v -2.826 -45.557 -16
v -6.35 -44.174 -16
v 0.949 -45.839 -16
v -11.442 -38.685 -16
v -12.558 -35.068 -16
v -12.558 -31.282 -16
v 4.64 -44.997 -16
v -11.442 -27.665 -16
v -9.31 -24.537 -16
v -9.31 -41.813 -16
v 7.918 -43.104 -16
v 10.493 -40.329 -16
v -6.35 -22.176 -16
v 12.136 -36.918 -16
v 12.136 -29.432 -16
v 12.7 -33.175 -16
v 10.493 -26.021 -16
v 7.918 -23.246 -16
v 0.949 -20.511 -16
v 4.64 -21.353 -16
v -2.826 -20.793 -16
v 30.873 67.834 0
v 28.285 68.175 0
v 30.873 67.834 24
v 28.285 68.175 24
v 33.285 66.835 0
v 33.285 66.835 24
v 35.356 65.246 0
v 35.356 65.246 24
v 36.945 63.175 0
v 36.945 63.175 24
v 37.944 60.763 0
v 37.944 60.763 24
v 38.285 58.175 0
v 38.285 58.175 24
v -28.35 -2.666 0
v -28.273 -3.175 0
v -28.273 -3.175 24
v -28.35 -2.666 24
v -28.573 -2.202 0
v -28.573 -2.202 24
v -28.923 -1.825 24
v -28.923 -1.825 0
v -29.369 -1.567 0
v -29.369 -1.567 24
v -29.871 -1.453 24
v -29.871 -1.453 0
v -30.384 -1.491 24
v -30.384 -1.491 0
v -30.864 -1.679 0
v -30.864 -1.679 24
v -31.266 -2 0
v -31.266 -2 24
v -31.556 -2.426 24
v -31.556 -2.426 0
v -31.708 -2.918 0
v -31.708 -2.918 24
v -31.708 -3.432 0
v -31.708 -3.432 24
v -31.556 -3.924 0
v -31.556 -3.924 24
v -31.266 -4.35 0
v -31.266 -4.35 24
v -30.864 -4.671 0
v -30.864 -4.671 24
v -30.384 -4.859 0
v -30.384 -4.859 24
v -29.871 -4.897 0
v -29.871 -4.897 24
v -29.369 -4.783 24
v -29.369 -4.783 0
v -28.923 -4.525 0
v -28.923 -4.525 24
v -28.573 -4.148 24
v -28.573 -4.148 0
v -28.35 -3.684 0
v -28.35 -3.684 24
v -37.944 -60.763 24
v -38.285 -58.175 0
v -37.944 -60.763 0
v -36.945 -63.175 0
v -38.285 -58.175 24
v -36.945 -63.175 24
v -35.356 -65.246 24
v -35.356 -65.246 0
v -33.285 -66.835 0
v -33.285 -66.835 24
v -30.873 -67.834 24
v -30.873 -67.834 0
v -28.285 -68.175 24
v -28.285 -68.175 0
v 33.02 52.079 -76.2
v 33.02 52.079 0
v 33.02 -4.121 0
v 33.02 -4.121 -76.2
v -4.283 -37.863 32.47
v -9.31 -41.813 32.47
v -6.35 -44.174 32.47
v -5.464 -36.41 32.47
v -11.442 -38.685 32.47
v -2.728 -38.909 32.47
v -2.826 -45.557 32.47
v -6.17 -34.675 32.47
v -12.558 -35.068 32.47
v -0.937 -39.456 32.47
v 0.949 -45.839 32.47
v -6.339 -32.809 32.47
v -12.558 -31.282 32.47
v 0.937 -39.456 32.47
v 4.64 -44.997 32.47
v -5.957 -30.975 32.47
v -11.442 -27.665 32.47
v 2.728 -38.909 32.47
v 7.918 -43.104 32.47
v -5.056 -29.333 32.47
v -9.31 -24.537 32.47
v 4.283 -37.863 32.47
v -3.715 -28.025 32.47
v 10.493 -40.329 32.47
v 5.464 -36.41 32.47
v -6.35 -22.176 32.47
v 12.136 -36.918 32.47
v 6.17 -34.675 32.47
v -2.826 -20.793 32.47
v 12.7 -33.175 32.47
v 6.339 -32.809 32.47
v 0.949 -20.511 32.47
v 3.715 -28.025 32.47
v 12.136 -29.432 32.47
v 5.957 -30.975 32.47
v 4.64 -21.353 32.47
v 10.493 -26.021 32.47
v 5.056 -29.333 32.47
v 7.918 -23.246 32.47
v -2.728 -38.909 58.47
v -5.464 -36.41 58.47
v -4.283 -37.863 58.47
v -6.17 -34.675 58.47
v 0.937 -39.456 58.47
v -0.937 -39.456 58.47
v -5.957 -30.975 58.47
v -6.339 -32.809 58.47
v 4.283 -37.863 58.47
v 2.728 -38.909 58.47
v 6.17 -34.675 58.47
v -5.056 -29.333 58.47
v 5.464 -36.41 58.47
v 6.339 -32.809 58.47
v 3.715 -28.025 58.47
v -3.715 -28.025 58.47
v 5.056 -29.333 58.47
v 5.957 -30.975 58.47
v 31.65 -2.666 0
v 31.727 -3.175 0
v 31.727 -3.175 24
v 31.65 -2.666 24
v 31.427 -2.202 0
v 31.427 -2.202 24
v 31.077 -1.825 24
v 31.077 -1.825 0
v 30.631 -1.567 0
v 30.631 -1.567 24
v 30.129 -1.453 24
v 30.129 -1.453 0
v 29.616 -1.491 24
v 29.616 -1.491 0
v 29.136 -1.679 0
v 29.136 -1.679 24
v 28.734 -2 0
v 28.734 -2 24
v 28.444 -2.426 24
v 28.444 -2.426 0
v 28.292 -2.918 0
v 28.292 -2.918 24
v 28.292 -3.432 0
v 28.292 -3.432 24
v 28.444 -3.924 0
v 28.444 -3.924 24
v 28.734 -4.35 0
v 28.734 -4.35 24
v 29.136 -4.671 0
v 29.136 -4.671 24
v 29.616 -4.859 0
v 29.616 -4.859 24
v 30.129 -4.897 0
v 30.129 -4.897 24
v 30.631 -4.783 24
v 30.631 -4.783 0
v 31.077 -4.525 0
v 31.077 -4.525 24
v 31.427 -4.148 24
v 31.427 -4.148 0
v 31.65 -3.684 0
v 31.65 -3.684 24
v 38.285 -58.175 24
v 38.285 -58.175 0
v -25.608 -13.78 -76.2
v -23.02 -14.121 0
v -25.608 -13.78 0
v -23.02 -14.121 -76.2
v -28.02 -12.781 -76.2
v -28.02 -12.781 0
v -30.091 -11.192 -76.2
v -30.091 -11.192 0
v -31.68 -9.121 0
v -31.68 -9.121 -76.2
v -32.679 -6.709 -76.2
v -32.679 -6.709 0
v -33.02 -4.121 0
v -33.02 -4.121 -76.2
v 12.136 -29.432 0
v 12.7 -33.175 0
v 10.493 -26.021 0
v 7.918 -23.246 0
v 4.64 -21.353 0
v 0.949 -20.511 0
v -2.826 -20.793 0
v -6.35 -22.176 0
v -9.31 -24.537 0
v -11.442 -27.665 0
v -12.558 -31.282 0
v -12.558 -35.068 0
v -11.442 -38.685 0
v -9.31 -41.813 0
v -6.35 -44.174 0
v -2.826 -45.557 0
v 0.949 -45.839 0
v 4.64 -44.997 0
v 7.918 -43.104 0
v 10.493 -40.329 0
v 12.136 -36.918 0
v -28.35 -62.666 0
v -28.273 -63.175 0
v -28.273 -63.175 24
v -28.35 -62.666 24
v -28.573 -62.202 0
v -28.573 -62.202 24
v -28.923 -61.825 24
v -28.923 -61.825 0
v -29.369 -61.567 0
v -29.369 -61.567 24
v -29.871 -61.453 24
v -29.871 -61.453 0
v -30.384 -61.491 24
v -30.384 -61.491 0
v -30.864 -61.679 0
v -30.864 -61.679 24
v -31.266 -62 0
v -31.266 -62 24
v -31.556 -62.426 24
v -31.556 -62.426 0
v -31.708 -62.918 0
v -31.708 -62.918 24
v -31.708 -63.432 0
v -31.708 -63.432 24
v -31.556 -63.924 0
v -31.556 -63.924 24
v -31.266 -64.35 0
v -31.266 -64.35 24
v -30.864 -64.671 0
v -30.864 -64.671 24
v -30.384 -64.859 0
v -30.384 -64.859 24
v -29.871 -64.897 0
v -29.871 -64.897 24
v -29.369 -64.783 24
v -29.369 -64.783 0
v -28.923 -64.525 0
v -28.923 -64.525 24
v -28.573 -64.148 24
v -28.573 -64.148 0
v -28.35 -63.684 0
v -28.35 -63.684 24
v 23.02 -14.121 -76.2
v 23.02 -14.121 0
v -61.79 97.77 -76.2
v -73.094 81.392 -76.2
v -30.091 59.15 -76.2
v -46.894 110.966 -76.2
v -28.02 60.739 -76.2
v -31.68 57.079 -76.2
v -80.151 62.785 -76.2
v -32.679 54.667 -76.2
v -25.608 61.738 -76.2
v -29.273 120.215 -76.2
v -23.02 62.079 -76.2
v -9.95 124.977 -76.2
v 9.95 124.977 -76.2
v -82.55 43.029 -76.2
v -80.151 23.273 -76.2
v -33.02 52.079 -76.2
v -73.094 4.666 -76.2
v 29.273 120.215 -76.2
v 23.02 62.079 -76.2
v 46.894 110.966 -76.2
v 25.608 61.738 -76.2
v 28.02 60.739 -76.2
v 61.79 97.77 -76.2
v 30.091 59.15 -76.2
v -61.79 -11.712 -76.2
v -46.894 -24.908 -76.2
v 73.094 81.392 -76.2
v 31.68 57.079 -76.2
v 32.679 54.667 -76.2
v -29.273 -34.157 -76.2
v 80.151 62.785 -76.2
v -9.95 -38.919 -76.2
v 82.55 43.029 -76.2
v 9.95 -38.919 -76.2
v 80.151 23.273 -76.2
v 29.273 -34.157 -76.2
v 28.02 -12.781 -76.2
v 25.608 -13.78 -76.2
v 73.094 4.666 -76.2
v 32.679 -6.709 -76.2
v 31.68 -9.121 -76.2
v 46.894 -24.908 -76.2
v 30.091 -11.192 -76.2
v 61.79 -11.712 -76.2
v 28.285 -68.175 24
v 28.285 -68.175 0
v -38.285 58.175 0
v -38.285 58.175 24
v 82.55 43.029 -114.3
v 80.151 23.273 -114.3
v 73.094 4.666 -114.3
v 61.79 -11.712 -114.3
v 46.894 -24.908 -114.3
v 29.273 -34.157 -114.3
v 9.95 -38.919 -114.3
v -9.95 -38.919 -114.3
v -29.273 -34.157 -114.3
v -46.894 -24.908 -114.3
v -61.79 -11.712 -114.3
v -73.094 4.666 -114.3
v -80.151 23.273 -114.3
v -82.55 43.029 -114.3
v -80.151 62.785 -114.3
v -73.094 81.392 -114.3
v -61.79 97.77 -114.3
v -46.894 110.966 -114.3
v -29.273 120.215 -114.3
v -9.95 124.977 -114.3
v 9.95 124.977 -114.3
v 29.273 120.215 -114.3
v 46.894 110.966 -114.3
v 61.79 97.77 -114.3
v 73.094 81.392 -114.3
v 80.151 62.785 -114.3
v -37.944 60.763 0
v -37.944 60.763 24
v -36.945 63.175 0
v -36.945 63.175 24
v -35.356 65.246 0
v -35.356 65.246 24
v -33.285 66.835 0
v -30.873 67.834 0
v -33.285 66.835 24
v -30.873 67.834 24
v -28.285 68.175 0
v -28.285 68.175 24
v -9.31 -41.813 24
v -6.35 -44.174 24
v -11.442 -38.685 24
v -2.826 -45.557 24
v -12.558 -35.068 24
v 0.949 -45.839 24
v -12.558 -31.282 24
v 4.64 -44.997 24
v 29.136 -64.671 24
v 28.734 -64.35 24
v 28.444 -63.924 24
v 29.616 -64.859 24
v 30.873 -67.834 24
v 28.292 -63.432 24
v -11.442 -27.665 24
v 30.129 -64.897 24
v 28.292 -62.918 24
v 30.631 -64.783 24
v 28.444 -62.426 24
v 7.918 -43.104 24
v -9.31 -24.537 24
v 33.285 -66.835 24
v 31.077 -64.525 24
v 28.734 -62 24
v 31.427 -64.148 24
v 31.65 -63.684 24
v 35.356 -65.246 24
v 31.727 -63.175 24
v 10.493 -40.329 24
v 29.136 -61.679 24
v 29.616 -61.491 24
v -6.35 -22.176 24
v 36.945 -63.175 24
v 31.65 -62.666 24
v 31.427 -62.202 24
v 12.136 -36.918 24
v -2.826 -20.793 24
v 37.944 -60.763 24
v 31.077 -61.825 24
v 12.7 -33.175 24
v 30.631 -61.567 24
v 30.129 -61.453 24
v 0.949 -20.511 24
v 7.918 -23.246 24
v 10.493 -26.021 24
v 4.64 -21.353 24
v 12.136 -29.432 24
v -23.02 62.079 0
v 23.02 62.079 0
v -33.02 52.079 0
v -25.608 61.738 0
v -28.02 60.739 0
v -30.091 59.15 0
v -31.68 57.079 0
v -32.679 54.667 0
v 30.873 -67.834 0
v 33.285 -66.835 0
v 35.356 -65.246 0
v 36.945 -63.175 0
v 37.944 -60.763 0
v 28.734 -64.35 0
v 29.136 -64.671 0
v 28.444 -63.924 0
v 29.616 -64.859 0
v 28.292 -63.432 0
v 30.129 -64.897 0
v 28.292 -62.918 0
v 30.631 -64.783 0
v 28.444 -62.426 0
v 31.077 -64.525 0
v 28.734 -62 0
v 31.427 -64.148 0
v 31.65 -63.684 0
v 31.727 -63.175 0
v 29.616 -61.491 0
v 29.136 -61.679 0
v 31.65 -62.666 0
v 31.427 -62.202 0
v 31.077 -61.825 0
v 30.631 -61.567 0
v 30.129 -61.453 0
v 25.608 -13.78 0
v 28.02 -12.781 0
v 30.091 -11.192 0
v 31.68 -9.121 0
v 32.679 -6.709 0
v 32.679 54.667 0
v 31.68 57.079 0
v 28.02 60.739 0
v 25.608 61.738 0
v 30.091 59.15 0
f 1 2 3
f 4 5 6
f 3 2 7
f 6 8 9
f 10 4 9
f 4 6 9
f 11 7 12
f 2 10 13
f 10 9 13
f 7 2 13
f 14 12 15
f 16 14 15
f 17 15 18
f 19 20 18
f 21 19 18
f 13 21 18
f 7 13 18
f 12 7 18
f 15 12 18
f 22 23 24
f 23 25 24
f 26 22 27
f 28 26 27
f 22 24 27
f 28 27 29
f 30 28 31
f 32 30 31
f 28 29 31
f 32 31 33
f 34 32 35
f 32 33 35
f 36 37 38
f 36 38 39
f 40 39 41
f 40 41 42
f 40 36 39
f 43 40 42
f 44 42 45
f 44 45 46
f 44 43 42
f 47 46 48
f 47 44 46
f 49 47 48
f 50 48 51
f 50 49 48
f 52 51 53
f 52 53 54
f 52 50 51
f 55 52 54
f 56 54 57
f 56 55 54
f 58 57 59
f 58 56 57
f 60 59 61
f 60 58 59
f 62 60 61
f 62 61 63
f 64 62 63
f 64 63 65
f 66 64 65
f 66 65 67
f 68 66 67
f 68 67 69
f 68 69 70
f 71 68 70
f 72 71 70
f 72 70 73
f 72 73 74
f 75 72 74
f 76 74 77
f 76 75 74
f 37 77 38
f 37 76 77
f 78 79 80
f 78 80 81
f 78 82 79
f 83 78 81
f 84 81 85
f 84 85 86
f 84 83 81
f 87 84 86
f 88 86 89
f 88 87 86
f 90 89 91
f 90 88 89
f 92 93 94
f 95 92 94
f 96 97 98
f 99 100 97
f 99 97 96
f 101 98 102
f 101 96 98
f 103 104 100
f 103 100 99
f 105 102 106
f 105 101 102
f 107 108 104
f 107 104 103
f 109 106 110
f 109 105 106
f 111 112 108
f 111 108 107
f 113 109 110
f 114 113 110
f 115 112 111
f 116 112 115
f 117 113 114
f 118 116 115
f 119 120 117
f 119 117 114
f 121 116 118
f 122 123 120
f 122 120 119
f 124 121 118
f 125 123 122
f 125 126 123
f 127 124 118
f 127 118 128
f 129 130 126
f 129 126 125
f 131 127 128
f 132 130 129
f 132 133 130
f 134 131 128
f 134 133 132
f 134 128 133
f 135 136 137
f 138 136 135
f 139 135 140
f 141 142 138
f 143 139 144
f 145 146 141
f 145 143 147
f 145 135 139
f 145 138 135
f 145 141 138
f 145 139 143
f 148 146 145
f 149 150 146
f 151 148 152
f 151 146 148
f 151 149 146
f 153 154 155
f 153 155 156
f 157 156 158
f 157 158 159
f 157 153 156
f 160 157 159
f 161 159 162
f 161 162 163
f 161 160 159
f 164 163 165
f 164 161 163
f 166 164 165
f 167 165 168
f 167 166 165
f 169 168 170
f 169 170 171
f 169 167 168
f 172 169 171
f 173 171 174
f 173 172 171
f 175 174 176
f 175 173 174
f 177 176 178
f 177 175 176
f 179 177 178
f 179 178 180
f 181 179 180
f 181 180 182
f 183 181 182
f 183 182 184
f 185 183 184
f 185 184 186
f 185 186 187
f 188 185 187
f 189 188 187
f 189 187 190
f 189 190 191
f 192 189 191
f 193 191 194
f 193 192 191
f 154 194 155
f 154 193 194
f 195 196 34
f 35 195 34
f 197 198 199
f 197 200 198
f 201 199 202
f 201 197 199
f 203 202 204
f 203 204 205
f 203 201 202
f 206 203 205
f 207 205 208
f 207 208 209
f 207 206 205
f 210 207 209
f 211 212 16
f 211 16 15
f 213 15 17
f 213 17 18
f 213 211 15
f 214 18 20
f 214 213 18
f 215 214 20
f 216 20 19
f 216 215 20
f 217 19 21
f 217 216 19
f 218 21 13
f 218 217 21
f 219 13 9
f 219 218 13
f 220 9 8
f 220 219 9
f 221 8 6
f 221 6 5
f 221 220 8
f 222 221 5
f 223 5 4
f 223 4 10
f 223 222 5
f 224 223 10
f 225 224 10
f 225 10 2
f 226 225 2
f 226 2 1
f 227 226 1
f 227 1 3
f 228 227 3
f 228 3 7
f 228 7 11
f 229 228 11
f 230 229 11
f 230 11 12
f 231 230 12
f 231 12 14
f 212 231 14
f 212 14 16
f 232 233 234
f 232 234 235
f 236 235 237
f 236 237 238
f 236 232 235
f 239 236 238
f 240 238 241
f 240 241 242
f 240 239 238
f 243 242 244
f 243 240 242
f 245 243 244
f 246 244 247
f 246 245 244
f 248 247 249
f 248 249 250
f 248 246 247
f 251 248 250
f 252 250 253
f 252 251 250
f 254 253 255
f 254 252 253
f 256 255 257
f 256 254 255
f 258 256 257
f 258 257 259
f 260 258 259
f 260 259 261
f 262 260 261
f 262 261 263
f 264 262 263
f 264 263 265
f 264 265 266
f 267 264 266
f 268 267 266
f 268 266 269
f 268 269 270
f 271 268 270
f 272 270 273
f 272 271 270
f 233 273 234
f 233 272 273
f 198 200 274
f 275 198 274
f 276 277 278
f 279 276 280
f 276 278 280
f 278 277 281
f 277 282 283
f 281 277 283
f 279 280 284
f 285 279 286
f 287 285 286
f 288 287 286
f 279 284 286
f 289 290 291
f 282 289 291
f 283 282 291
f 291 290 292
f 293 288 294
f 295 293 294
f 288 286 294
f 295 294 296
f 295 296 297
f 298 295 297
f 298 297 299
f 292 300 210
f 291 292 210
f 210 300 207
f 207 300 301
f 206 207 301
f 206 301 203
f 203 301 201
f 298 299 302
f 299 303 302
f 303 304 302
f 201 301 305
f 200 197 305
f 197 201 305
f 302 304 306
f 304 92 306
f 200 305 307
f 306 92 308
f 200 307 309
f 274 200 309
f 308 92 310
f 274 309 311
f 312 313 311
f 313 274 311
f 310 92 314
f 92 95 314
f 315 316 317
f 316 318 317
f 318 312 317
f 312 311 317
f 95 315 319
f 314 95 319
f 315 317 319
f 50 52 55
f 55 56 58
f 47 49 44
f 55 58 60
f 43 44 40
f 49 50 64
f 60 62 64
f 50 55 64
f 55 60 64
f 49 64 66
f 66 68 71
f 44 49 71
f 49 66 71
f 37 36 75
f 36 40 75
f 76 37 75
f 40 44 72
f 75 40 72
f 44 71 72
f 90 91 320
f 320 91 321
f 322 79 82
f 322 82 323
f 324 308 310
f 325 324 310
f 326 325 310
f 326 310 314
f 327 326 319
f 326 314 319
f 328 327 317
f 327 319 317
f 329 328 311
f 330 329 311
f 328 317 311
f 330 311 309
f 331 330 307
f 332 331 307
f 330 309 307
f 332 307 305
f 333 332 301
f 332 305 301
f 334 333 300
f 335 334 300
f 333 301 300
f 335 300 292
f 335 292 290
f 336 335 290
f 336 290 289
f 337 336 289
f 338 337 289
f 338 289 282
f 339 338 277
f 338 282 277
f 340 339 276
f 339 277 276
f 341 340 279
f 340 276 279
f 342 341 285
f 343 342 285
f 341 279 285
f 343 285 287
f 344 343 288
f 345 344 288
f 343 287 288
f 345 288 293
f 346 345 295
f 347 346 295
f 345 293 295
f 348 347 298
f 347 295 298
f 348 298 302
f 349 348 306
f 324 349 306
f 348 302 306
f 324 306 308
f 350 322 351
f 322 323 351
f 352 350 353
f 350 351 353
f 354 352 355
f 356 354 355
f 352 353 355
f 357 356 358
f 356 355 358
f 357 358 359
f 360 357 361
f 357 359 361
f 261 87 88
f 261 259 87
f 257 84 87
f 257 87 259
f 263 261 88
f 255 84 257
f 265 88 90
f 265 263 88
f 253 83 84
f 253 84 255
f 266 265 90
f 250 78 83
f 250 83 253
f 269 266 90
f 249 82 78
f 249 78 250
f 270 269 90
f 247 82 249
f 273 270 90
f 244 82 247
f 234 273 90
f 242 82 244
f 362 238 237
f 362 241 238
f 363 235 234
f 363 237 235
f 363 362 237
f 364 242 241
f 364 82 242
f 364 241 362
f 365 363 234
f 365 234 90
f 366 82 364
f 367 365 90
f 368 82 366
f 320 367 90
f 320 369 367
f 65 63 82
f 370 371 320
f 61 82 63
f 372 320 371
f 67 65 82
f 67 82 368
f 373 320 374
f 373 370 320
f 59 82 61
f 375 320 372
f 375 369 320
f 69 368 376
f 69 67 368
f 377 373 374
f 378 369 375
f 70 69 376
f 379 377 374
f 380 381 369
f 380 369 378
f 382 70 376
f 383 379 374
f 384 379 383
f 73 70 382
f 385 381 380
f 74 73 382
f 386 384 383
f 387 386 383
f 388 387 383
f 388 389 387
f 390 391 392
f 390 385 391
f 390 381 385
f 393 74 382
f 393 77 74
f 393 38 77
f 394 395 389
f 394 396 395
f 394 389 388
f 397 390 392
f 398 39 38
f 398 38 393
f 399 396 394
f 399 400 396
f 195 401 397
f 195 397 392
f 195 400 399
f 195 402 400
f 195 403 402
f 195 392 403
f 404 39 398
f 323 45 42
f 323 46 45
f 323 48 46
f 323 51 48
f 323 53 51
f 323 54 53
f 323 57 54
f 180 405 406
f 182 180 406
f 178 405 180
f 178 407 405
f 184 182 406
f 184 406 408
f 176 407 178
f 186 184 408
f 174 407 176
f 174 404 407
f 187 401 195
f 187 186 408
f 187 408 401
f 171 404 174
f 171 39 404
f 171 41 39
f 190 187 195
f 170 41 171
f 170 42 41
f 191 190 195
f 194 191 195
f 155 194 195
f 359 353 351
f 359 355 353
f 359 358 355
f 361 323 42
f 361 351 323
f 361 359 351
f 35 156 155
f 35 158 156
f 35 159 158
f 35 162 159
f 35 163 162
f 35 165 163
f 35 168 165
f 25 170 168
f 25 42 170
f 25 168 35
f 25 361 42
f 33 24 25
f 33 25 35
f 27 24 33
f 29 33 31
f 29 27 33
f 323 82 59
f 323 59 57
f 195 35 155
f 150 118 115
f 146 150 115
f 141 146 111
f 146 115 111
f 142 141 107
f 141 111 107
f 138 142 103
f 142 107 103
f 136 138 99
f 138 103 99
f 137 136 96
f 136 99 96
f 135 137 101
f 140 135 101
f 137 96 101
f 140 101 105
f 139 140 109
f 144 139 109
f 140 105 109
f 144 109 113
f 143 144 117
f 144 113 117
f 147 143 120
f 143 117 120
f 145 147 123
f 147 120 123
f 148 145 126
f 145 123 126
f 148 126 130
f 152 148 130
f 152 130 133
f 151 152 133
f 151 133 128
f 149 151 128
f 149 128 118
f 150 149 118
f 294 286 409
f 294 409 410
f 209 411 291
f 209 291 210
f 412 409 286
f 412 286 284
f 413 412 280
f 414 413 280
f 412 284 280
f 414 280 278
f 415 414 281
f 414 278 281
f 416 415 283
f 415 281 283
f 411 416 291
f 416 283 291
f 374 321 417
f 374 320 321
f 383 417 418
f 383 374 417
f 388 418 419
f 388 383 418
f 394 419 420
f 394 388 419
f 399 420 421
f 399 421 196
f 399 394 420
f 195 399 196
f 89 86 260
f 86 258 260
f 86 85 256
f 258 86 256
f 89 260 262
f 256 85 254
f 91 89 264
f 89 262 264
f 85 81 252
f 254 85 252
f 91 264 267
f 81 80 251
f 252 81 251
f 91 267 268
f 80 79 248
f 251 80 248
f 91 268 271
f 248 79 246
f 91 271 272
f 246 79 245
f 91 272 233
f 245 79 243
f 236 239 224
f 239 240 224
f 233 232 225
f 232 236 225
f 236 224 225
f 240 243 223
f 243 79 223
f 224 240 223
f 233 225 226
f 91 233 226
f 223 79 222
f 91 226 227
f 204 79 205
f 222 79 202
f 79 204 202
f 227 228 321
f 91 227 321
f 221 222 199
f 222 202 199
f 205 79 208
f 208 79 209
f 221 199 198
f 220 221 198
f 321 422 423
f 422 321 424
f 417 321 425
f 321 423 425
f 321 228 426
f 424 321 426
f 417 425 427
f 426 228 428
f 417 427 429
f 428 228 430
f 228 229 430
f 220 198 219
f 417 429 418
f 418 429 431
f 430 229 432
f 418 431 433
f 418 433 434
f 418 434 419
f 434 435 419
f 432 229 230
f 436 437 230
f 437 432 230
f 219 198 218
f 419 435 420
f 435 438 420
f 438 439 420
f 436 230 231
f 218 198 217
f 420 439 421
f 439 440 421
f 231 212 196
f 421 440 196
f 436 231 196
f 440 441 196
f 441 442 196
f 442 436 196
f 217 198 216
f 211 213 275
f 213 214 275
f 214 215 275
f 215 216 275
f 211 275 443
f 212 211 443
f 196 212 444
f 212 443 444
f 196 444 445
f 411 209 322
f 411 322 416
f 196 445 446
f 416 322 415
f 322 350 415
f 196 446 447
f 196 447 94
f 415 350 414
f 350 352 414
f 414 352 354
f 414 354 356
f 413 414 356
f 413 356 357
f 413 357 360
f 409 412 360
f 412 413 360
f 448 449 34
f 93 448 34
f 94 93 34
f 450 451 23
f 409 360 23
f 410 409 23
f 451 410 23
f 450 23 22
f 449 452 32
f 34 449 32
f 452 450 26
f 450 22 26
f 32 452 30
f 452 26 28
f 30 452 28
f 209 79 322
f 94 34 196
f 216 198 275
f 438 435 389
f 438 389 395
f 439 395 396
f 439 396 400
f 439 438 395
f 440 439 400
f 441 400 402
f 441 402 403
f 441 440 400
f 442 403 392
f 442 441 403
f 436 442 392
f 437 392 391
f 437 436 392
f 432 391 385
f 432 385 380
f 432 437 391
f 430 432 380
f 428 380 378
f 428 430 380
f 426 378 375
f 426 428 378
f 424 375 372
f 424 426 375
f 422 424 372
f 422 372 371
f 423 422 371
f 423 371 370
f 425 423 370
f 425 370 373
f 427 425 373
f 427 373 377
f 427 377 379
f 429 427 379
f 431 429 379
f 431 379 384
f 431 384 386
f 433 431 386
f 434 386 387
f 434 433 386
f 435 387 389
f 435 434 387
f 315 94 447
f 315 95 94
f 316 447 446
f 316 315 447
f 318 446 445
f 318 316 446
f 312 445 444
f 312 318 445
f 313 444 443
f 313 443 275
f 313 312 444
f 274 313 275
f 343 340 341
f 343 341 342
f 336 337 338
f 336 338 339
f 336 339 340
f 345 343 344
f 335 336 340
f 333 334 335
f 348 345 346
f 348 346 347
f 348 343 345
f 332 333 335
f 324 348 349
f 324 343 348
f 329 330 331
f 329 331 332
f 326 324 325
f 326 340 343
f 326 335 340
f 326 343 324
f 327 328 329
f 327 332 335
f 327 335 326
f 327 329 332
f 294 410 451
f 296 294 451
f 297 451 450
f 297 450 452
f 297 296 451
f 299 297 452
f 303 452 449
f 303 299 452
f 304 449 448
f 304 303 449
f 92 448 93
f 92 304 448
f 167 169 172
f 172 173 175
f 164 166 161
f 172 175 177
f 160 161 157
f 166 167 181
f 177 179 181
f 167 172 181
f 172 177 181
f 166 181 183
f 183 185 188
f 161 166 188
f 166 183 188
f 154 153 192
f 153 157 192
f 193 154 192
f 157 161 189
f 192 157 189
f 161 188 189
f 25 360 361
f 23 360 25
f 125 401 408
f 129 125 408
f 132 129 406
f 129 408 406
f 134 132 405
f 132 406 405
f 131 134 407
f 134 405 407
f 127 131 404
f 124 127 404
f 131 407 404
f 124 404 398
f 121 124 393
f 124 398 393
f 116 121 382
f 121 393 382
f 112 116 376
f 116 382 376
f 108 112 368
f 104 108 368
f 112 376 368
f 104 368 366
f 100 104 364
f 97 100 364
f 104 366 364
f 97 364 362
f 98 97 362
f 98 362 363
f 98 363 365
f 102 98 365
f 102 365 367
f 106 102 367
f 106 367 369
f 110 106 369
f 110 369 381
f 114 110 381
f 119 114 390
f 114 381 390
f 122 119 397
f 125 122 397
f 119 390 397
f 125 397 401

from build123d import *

# Parameters (mm, degrees)
F0_W          = 76.57
F0_H          = 136.35
F0_R          = 1.7272
F1_DEPTH      = 24
F2_R          = 12.7
F3_DEPTH      = 8.47
F3_DEPTH_BACK = 40
F5_DEPTH      = 26
F6_W          = 66.04
F6_H          = 76.2
F7_DEPTH      = 76.2
F8_R          = 82.55
F9_DEPTH      = 38.1
F10_R         = 10


with BuildPart() as f1:
    # F0 (on Top) → F1 (new body)
    with BuildSketch(Plane.XY):
        Rectangle(F0_W, F0_H)
        with Locations((-30, -63.175)):
            Circle(F0_R, mode=Mode.SUBTRACT)
        with Locations((-30, -3.175)):
            Circle(F0_R, mode=Mode.SUBTRACT)
        with Locations((30, -63.175)):
            Circle(F0_R, mode=Mode.SUBTRACT)
        with Locations((30, -3.175)):
            Circle(F0_R, mode=Mode.SUBTRACT)
    extrude(amount=F1_DEPTH)

    # F2 (on face) → F3 (join, two sides)
    with BuildSketch(Plane.XY.offset(24)) as f3_sk:
        with Locations((0, -33.175)):
            Circle(F2_R)
    extrude(amount=F3_DEPTH)
    extrude(f3_sk.sketch, amount=-F3_DEPTH_BACK)

    # F4 (on face) → F5 (join)
    with BuildSketch(Plane.XY.offset(32.47)):
        with BuildLine():
            ThreePointArc((-3.714835, -28.025), (0, -39.525), (3.714835, -28.025))
            Line((3.714835, -28.025), (-3.714835, -28.025))
        make_face()
    extrude(amount=F5_DEPTH)

    # F6 (on face) → F7 (join)
    with BuildSketch(Plane(origin=(0, 0, 0), x_dir=(1, 0, 0), z_dir=(0, 0, -1))):
        with Locations((0, -23.979)):
            Rectangle(F6_W, F6_H)
    extrude(amount=F7_DEPTH)

    # F8 (on face) → F9 (join)
    with BuildSketch(Plane(origin=(0, 0, -76.2), x_dir=(1, 0, 0), z_dir=(0, 0, -1))):
        with Locations((0, -43.029)):
            Circle(F8_R)
    extrude(amount=F9_DEPTH)

    # F10
    f10_edges = [f1.edges().sort_by_distance(p)[0] for p in [
        (-33.02, 62.079, -38.1),
        (-33.02, -14.121, -38.1),
        (33.02, 62.079, -38.1),
        (33.02, -14.121, -38.1),
        (38.285, 68.175, 12),
        (-38.285, 68.175, 12),
        (-38.285, -68.175, 12),
        (38.285, -68.175, 12),
    ]]
    fillet(f10_edges, radius=F10_R)


solid = f1.part
